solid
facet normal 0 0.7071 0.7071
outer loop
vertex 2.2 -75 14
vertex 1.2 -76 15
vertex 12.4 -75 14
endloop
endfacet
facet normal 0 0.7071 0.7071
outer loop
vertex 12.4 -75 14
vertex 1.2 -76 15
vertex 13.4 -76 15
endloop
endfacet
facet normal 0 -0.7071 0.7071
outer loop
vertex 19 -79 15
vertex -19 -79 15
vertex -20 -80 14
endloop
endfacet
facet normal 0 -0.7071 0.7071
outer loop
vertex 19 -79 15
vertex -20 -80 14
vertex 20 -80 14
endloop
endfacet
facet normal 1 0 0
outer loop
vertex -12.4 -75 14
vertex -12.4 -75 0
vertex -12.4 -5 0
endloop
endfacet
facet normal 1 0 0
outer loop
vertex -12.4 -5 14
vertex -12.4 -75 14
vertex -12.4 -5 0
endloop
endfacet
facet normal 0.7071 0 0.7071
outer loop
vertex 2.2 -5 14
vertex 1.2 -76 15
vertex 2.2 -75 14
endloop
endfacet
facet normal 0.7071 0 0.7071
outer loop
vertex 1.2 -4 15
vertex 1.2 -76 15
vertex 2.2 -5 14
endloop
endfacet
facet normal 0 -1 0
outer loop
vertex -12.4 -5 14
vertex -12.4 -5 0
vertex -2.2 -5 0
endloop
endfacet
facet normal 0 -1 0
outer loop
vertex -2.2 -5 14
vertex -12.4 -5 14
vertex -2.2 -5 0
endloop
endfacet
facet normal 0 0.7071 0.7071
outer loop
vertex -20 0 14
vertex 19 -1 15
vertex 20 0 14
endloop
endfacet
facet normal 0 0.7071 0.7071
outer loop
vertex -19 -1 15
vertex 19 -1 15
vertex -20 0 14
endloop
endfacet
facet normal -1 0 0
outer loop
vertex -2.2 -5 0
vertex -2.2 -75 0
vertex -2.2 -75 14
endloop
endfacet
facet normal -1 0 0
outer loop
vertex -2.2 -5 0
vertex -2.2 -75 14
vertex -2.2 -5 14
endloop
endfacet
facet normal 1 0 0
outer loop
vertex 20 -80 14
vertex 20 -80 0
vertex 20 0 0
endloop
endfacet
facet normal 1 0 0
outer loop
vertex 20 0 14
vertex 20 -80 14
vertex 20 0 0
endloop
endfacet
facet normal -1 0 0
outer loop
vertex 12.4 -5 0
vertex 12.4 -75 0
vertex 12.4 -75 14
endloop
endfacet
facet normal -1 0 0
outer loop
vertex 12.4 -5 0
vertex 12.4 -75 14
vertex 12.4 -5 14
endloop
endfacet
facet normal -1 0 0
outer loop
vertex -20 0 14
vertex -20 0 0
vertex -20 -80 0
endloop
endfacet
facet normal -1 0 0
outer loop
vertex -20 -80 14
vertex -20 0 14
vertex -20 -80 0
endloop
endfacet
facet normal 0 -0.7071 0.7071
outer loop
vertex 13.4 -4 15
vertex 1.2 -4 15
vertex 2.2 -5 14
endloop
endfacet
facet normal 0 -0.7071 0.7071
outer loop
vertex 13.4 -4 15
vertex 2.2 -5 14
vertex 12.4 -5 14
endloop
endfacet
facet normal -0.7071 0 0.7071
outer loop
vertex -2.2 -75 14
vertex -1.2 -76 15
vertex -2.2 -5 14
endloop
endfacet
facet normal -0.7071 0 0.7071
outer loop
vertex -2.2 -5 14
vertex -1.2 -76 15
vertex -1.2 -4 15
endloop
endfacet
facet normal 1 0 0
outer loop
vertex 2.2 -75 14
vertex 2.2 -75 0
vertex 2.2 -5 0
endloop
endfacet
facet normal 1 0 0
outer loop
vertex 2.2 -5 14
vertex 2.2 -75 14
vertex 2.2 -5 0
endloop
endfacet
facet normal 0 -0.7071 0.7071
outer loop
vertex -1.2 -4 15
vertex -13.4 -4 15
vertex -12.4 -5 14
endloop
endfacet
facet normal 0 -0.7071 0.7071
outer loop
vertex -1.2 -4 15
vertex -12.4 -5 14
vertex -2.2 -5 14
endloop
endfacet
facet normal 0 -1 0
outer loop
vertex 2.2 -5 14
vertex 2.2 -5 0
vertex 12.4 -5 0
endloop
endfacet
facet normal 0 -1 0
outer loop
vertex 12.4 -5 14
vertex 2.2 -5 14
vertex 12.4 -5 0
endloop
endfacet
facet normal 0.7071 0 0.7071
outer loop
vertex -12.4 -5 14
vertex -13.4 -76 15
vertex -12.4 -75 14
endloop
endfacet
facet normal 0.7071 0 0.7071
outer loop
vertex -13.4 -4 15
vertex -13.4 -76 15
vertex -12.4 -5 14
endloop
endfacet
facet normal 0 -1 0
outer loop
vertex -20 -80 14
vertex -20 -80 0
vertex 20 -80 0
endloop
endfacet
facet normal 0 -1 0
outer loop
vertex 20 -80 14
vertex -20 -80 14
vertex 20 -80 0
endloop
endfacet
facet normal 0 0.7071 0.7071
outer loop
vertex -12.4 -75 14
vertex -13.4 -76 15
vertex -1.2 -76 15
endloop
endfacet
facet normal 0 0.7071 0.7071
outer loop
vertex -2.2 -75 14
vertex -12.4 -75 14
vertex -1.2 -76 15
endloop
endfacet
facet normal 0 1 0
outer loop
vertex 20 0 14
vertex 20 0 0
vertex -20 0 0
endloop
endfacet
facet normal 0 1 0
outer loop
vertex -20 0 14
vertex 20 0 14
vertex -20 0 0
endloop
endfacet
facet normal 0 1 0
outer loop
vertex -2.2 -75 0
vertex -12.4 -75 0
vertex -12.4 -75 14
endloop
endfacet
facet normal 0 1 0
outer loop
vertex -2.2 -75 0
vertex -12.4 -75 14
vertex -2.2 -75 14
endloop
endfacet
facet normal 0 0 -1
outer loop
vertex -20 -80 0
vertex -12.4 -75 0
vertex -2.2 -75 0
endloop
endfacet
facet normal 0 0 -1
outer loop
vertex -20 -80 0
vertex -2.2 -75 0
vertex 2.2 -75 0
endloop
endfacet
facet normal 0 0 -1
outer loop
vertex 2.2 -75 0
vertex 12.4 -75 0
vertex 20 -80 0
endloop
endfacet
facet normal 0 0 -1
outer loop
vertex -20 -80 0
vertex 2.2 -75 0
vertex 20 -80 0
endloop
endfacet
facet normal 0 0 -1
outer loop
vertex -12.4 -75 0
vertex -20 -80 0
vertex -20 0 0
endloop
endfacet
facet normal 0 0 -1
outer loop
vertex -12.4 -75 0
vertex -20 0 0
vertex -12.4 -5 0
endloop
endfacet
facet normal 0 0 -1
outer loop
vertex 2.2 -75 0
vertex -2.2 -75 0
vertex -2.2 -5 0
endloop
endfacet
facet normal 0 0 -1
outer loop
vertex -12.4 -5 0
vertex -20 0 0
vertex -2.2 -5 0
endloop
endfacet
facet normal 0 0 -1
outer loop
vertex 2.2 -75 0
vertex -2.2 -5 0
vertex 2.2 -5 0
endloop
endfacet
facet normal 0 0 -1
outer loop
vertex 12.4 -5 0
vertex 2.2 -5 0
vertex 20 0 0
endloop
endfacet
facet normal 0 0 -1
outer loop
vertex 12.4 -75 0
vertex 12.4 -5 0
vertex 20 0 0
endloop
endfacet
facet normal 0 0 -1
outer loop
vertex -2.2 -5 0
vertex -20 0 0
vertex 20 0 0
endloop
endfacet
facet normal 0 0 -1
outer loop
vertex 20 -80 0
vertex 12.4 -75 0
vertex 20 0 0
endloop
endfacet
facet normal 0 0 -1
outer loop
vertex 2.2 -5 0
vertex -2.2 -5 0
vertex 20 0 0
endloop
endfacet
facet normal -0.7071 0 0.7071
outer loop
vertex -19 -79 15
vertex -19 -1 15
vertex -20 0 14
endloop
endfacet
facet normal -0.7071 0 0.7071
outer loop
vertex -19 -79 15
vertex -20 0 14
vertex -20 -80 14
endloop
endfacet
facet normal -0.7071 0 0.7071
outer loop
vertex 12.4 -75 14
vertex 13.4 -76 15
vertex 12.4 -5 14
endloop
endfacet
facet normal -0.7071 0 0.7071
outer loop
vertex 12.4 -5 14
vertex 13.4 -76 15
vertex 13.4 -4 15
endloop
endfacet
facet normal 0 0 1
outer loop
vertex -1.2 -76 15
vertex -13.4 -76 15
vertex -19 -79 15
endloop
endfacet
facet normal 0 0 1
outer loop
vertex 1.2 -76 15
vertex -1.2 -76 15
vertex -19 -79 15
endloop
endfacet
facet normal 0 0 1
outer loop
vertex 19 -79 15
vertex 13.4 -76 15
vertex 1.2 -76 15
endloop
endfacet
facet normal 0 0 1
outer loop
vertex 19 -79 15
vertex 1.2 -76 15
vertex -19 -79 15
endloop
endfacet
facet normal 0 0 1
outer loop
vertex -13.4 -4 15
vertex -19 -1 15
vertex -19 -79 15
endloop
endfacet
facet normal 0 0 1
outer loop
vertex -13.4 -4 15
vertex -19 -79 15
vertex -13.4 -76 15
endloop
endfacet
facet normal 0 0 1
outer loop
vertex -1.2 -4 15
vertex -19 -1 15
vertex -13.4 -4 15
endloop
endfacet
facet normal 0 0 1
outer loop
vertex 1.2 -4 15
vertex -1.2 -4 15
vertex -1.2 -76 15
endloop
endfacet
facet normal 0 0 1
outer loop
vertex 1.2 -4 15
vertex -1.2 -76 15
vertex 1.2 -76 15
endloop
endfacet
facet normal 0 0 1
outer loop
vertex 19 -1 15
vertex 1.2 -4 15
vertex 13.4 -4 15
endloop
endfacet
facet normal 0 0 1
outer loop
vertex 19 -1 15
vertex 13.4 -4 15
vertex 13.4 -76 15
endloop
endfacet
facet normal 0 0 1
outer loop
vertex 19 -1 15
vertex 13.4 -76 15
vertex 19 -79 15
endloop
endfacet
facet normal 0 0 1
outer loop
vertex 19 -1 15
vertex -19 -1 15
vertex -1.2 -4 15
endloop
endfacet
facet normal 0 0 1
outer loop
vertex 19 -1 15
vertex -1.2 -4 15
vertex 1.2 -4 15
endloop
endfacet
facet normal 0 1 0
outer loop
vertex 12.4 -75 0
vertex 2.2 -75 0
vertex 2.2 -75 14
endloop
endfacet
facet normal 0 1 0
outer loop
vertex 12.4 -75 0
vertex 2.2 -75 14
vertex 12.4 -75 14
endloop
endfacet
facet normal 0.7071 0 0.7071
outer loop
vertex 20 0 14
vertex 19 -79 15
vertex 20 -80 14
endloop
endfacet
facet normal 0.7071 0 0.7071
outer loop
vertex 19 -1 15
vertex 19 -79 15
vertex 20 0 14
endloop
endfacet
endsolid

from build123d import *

# Parameters (mm, degrees)
F0_W     = 10.2
F0_H     = 70
F1_DEPTH = 15
F2_SIZE  = 1


with BuildPart() as f1:
    # F0 (on Top) → F1 (new body)
    with BuildSketch(Plane.XY):
        Polygon((20, 0), (0, 0), (-20, 0), (-20, -80), (0, -80), (20, -80), align=None)
        with Locations((-7.3, -40)):
            Rectangle(F0_W, F0_H, mode=Mode.SUBTRACT)
        with Locations((7.3, -40)):
            Rectangle(F0_W, F0_H, mode=Mode.SUBTRACT)
    extrude(amount=F1_DEPTH)

    # F2
    f2_edges = [f1.edges().sort_by_distance(p)[0] for p in [
        (0, 0, 15),
        (-20, -40, 15),
        (0, -80, 15),
        (20, -40, 15),
        (-7.3, -75, 15),
        (-12.4, -40, 15),
        (-7.3, -5, 15),
        (-2.2, -40, 15),
        (7.3, -5, 15),
        (12.4, -40, 15),
        (7.3, -75, 15),
        (2.2, -40, 15),
    ]]
    chamfer(f2_edges, length=F2_SIZE)


solid = f1.part
